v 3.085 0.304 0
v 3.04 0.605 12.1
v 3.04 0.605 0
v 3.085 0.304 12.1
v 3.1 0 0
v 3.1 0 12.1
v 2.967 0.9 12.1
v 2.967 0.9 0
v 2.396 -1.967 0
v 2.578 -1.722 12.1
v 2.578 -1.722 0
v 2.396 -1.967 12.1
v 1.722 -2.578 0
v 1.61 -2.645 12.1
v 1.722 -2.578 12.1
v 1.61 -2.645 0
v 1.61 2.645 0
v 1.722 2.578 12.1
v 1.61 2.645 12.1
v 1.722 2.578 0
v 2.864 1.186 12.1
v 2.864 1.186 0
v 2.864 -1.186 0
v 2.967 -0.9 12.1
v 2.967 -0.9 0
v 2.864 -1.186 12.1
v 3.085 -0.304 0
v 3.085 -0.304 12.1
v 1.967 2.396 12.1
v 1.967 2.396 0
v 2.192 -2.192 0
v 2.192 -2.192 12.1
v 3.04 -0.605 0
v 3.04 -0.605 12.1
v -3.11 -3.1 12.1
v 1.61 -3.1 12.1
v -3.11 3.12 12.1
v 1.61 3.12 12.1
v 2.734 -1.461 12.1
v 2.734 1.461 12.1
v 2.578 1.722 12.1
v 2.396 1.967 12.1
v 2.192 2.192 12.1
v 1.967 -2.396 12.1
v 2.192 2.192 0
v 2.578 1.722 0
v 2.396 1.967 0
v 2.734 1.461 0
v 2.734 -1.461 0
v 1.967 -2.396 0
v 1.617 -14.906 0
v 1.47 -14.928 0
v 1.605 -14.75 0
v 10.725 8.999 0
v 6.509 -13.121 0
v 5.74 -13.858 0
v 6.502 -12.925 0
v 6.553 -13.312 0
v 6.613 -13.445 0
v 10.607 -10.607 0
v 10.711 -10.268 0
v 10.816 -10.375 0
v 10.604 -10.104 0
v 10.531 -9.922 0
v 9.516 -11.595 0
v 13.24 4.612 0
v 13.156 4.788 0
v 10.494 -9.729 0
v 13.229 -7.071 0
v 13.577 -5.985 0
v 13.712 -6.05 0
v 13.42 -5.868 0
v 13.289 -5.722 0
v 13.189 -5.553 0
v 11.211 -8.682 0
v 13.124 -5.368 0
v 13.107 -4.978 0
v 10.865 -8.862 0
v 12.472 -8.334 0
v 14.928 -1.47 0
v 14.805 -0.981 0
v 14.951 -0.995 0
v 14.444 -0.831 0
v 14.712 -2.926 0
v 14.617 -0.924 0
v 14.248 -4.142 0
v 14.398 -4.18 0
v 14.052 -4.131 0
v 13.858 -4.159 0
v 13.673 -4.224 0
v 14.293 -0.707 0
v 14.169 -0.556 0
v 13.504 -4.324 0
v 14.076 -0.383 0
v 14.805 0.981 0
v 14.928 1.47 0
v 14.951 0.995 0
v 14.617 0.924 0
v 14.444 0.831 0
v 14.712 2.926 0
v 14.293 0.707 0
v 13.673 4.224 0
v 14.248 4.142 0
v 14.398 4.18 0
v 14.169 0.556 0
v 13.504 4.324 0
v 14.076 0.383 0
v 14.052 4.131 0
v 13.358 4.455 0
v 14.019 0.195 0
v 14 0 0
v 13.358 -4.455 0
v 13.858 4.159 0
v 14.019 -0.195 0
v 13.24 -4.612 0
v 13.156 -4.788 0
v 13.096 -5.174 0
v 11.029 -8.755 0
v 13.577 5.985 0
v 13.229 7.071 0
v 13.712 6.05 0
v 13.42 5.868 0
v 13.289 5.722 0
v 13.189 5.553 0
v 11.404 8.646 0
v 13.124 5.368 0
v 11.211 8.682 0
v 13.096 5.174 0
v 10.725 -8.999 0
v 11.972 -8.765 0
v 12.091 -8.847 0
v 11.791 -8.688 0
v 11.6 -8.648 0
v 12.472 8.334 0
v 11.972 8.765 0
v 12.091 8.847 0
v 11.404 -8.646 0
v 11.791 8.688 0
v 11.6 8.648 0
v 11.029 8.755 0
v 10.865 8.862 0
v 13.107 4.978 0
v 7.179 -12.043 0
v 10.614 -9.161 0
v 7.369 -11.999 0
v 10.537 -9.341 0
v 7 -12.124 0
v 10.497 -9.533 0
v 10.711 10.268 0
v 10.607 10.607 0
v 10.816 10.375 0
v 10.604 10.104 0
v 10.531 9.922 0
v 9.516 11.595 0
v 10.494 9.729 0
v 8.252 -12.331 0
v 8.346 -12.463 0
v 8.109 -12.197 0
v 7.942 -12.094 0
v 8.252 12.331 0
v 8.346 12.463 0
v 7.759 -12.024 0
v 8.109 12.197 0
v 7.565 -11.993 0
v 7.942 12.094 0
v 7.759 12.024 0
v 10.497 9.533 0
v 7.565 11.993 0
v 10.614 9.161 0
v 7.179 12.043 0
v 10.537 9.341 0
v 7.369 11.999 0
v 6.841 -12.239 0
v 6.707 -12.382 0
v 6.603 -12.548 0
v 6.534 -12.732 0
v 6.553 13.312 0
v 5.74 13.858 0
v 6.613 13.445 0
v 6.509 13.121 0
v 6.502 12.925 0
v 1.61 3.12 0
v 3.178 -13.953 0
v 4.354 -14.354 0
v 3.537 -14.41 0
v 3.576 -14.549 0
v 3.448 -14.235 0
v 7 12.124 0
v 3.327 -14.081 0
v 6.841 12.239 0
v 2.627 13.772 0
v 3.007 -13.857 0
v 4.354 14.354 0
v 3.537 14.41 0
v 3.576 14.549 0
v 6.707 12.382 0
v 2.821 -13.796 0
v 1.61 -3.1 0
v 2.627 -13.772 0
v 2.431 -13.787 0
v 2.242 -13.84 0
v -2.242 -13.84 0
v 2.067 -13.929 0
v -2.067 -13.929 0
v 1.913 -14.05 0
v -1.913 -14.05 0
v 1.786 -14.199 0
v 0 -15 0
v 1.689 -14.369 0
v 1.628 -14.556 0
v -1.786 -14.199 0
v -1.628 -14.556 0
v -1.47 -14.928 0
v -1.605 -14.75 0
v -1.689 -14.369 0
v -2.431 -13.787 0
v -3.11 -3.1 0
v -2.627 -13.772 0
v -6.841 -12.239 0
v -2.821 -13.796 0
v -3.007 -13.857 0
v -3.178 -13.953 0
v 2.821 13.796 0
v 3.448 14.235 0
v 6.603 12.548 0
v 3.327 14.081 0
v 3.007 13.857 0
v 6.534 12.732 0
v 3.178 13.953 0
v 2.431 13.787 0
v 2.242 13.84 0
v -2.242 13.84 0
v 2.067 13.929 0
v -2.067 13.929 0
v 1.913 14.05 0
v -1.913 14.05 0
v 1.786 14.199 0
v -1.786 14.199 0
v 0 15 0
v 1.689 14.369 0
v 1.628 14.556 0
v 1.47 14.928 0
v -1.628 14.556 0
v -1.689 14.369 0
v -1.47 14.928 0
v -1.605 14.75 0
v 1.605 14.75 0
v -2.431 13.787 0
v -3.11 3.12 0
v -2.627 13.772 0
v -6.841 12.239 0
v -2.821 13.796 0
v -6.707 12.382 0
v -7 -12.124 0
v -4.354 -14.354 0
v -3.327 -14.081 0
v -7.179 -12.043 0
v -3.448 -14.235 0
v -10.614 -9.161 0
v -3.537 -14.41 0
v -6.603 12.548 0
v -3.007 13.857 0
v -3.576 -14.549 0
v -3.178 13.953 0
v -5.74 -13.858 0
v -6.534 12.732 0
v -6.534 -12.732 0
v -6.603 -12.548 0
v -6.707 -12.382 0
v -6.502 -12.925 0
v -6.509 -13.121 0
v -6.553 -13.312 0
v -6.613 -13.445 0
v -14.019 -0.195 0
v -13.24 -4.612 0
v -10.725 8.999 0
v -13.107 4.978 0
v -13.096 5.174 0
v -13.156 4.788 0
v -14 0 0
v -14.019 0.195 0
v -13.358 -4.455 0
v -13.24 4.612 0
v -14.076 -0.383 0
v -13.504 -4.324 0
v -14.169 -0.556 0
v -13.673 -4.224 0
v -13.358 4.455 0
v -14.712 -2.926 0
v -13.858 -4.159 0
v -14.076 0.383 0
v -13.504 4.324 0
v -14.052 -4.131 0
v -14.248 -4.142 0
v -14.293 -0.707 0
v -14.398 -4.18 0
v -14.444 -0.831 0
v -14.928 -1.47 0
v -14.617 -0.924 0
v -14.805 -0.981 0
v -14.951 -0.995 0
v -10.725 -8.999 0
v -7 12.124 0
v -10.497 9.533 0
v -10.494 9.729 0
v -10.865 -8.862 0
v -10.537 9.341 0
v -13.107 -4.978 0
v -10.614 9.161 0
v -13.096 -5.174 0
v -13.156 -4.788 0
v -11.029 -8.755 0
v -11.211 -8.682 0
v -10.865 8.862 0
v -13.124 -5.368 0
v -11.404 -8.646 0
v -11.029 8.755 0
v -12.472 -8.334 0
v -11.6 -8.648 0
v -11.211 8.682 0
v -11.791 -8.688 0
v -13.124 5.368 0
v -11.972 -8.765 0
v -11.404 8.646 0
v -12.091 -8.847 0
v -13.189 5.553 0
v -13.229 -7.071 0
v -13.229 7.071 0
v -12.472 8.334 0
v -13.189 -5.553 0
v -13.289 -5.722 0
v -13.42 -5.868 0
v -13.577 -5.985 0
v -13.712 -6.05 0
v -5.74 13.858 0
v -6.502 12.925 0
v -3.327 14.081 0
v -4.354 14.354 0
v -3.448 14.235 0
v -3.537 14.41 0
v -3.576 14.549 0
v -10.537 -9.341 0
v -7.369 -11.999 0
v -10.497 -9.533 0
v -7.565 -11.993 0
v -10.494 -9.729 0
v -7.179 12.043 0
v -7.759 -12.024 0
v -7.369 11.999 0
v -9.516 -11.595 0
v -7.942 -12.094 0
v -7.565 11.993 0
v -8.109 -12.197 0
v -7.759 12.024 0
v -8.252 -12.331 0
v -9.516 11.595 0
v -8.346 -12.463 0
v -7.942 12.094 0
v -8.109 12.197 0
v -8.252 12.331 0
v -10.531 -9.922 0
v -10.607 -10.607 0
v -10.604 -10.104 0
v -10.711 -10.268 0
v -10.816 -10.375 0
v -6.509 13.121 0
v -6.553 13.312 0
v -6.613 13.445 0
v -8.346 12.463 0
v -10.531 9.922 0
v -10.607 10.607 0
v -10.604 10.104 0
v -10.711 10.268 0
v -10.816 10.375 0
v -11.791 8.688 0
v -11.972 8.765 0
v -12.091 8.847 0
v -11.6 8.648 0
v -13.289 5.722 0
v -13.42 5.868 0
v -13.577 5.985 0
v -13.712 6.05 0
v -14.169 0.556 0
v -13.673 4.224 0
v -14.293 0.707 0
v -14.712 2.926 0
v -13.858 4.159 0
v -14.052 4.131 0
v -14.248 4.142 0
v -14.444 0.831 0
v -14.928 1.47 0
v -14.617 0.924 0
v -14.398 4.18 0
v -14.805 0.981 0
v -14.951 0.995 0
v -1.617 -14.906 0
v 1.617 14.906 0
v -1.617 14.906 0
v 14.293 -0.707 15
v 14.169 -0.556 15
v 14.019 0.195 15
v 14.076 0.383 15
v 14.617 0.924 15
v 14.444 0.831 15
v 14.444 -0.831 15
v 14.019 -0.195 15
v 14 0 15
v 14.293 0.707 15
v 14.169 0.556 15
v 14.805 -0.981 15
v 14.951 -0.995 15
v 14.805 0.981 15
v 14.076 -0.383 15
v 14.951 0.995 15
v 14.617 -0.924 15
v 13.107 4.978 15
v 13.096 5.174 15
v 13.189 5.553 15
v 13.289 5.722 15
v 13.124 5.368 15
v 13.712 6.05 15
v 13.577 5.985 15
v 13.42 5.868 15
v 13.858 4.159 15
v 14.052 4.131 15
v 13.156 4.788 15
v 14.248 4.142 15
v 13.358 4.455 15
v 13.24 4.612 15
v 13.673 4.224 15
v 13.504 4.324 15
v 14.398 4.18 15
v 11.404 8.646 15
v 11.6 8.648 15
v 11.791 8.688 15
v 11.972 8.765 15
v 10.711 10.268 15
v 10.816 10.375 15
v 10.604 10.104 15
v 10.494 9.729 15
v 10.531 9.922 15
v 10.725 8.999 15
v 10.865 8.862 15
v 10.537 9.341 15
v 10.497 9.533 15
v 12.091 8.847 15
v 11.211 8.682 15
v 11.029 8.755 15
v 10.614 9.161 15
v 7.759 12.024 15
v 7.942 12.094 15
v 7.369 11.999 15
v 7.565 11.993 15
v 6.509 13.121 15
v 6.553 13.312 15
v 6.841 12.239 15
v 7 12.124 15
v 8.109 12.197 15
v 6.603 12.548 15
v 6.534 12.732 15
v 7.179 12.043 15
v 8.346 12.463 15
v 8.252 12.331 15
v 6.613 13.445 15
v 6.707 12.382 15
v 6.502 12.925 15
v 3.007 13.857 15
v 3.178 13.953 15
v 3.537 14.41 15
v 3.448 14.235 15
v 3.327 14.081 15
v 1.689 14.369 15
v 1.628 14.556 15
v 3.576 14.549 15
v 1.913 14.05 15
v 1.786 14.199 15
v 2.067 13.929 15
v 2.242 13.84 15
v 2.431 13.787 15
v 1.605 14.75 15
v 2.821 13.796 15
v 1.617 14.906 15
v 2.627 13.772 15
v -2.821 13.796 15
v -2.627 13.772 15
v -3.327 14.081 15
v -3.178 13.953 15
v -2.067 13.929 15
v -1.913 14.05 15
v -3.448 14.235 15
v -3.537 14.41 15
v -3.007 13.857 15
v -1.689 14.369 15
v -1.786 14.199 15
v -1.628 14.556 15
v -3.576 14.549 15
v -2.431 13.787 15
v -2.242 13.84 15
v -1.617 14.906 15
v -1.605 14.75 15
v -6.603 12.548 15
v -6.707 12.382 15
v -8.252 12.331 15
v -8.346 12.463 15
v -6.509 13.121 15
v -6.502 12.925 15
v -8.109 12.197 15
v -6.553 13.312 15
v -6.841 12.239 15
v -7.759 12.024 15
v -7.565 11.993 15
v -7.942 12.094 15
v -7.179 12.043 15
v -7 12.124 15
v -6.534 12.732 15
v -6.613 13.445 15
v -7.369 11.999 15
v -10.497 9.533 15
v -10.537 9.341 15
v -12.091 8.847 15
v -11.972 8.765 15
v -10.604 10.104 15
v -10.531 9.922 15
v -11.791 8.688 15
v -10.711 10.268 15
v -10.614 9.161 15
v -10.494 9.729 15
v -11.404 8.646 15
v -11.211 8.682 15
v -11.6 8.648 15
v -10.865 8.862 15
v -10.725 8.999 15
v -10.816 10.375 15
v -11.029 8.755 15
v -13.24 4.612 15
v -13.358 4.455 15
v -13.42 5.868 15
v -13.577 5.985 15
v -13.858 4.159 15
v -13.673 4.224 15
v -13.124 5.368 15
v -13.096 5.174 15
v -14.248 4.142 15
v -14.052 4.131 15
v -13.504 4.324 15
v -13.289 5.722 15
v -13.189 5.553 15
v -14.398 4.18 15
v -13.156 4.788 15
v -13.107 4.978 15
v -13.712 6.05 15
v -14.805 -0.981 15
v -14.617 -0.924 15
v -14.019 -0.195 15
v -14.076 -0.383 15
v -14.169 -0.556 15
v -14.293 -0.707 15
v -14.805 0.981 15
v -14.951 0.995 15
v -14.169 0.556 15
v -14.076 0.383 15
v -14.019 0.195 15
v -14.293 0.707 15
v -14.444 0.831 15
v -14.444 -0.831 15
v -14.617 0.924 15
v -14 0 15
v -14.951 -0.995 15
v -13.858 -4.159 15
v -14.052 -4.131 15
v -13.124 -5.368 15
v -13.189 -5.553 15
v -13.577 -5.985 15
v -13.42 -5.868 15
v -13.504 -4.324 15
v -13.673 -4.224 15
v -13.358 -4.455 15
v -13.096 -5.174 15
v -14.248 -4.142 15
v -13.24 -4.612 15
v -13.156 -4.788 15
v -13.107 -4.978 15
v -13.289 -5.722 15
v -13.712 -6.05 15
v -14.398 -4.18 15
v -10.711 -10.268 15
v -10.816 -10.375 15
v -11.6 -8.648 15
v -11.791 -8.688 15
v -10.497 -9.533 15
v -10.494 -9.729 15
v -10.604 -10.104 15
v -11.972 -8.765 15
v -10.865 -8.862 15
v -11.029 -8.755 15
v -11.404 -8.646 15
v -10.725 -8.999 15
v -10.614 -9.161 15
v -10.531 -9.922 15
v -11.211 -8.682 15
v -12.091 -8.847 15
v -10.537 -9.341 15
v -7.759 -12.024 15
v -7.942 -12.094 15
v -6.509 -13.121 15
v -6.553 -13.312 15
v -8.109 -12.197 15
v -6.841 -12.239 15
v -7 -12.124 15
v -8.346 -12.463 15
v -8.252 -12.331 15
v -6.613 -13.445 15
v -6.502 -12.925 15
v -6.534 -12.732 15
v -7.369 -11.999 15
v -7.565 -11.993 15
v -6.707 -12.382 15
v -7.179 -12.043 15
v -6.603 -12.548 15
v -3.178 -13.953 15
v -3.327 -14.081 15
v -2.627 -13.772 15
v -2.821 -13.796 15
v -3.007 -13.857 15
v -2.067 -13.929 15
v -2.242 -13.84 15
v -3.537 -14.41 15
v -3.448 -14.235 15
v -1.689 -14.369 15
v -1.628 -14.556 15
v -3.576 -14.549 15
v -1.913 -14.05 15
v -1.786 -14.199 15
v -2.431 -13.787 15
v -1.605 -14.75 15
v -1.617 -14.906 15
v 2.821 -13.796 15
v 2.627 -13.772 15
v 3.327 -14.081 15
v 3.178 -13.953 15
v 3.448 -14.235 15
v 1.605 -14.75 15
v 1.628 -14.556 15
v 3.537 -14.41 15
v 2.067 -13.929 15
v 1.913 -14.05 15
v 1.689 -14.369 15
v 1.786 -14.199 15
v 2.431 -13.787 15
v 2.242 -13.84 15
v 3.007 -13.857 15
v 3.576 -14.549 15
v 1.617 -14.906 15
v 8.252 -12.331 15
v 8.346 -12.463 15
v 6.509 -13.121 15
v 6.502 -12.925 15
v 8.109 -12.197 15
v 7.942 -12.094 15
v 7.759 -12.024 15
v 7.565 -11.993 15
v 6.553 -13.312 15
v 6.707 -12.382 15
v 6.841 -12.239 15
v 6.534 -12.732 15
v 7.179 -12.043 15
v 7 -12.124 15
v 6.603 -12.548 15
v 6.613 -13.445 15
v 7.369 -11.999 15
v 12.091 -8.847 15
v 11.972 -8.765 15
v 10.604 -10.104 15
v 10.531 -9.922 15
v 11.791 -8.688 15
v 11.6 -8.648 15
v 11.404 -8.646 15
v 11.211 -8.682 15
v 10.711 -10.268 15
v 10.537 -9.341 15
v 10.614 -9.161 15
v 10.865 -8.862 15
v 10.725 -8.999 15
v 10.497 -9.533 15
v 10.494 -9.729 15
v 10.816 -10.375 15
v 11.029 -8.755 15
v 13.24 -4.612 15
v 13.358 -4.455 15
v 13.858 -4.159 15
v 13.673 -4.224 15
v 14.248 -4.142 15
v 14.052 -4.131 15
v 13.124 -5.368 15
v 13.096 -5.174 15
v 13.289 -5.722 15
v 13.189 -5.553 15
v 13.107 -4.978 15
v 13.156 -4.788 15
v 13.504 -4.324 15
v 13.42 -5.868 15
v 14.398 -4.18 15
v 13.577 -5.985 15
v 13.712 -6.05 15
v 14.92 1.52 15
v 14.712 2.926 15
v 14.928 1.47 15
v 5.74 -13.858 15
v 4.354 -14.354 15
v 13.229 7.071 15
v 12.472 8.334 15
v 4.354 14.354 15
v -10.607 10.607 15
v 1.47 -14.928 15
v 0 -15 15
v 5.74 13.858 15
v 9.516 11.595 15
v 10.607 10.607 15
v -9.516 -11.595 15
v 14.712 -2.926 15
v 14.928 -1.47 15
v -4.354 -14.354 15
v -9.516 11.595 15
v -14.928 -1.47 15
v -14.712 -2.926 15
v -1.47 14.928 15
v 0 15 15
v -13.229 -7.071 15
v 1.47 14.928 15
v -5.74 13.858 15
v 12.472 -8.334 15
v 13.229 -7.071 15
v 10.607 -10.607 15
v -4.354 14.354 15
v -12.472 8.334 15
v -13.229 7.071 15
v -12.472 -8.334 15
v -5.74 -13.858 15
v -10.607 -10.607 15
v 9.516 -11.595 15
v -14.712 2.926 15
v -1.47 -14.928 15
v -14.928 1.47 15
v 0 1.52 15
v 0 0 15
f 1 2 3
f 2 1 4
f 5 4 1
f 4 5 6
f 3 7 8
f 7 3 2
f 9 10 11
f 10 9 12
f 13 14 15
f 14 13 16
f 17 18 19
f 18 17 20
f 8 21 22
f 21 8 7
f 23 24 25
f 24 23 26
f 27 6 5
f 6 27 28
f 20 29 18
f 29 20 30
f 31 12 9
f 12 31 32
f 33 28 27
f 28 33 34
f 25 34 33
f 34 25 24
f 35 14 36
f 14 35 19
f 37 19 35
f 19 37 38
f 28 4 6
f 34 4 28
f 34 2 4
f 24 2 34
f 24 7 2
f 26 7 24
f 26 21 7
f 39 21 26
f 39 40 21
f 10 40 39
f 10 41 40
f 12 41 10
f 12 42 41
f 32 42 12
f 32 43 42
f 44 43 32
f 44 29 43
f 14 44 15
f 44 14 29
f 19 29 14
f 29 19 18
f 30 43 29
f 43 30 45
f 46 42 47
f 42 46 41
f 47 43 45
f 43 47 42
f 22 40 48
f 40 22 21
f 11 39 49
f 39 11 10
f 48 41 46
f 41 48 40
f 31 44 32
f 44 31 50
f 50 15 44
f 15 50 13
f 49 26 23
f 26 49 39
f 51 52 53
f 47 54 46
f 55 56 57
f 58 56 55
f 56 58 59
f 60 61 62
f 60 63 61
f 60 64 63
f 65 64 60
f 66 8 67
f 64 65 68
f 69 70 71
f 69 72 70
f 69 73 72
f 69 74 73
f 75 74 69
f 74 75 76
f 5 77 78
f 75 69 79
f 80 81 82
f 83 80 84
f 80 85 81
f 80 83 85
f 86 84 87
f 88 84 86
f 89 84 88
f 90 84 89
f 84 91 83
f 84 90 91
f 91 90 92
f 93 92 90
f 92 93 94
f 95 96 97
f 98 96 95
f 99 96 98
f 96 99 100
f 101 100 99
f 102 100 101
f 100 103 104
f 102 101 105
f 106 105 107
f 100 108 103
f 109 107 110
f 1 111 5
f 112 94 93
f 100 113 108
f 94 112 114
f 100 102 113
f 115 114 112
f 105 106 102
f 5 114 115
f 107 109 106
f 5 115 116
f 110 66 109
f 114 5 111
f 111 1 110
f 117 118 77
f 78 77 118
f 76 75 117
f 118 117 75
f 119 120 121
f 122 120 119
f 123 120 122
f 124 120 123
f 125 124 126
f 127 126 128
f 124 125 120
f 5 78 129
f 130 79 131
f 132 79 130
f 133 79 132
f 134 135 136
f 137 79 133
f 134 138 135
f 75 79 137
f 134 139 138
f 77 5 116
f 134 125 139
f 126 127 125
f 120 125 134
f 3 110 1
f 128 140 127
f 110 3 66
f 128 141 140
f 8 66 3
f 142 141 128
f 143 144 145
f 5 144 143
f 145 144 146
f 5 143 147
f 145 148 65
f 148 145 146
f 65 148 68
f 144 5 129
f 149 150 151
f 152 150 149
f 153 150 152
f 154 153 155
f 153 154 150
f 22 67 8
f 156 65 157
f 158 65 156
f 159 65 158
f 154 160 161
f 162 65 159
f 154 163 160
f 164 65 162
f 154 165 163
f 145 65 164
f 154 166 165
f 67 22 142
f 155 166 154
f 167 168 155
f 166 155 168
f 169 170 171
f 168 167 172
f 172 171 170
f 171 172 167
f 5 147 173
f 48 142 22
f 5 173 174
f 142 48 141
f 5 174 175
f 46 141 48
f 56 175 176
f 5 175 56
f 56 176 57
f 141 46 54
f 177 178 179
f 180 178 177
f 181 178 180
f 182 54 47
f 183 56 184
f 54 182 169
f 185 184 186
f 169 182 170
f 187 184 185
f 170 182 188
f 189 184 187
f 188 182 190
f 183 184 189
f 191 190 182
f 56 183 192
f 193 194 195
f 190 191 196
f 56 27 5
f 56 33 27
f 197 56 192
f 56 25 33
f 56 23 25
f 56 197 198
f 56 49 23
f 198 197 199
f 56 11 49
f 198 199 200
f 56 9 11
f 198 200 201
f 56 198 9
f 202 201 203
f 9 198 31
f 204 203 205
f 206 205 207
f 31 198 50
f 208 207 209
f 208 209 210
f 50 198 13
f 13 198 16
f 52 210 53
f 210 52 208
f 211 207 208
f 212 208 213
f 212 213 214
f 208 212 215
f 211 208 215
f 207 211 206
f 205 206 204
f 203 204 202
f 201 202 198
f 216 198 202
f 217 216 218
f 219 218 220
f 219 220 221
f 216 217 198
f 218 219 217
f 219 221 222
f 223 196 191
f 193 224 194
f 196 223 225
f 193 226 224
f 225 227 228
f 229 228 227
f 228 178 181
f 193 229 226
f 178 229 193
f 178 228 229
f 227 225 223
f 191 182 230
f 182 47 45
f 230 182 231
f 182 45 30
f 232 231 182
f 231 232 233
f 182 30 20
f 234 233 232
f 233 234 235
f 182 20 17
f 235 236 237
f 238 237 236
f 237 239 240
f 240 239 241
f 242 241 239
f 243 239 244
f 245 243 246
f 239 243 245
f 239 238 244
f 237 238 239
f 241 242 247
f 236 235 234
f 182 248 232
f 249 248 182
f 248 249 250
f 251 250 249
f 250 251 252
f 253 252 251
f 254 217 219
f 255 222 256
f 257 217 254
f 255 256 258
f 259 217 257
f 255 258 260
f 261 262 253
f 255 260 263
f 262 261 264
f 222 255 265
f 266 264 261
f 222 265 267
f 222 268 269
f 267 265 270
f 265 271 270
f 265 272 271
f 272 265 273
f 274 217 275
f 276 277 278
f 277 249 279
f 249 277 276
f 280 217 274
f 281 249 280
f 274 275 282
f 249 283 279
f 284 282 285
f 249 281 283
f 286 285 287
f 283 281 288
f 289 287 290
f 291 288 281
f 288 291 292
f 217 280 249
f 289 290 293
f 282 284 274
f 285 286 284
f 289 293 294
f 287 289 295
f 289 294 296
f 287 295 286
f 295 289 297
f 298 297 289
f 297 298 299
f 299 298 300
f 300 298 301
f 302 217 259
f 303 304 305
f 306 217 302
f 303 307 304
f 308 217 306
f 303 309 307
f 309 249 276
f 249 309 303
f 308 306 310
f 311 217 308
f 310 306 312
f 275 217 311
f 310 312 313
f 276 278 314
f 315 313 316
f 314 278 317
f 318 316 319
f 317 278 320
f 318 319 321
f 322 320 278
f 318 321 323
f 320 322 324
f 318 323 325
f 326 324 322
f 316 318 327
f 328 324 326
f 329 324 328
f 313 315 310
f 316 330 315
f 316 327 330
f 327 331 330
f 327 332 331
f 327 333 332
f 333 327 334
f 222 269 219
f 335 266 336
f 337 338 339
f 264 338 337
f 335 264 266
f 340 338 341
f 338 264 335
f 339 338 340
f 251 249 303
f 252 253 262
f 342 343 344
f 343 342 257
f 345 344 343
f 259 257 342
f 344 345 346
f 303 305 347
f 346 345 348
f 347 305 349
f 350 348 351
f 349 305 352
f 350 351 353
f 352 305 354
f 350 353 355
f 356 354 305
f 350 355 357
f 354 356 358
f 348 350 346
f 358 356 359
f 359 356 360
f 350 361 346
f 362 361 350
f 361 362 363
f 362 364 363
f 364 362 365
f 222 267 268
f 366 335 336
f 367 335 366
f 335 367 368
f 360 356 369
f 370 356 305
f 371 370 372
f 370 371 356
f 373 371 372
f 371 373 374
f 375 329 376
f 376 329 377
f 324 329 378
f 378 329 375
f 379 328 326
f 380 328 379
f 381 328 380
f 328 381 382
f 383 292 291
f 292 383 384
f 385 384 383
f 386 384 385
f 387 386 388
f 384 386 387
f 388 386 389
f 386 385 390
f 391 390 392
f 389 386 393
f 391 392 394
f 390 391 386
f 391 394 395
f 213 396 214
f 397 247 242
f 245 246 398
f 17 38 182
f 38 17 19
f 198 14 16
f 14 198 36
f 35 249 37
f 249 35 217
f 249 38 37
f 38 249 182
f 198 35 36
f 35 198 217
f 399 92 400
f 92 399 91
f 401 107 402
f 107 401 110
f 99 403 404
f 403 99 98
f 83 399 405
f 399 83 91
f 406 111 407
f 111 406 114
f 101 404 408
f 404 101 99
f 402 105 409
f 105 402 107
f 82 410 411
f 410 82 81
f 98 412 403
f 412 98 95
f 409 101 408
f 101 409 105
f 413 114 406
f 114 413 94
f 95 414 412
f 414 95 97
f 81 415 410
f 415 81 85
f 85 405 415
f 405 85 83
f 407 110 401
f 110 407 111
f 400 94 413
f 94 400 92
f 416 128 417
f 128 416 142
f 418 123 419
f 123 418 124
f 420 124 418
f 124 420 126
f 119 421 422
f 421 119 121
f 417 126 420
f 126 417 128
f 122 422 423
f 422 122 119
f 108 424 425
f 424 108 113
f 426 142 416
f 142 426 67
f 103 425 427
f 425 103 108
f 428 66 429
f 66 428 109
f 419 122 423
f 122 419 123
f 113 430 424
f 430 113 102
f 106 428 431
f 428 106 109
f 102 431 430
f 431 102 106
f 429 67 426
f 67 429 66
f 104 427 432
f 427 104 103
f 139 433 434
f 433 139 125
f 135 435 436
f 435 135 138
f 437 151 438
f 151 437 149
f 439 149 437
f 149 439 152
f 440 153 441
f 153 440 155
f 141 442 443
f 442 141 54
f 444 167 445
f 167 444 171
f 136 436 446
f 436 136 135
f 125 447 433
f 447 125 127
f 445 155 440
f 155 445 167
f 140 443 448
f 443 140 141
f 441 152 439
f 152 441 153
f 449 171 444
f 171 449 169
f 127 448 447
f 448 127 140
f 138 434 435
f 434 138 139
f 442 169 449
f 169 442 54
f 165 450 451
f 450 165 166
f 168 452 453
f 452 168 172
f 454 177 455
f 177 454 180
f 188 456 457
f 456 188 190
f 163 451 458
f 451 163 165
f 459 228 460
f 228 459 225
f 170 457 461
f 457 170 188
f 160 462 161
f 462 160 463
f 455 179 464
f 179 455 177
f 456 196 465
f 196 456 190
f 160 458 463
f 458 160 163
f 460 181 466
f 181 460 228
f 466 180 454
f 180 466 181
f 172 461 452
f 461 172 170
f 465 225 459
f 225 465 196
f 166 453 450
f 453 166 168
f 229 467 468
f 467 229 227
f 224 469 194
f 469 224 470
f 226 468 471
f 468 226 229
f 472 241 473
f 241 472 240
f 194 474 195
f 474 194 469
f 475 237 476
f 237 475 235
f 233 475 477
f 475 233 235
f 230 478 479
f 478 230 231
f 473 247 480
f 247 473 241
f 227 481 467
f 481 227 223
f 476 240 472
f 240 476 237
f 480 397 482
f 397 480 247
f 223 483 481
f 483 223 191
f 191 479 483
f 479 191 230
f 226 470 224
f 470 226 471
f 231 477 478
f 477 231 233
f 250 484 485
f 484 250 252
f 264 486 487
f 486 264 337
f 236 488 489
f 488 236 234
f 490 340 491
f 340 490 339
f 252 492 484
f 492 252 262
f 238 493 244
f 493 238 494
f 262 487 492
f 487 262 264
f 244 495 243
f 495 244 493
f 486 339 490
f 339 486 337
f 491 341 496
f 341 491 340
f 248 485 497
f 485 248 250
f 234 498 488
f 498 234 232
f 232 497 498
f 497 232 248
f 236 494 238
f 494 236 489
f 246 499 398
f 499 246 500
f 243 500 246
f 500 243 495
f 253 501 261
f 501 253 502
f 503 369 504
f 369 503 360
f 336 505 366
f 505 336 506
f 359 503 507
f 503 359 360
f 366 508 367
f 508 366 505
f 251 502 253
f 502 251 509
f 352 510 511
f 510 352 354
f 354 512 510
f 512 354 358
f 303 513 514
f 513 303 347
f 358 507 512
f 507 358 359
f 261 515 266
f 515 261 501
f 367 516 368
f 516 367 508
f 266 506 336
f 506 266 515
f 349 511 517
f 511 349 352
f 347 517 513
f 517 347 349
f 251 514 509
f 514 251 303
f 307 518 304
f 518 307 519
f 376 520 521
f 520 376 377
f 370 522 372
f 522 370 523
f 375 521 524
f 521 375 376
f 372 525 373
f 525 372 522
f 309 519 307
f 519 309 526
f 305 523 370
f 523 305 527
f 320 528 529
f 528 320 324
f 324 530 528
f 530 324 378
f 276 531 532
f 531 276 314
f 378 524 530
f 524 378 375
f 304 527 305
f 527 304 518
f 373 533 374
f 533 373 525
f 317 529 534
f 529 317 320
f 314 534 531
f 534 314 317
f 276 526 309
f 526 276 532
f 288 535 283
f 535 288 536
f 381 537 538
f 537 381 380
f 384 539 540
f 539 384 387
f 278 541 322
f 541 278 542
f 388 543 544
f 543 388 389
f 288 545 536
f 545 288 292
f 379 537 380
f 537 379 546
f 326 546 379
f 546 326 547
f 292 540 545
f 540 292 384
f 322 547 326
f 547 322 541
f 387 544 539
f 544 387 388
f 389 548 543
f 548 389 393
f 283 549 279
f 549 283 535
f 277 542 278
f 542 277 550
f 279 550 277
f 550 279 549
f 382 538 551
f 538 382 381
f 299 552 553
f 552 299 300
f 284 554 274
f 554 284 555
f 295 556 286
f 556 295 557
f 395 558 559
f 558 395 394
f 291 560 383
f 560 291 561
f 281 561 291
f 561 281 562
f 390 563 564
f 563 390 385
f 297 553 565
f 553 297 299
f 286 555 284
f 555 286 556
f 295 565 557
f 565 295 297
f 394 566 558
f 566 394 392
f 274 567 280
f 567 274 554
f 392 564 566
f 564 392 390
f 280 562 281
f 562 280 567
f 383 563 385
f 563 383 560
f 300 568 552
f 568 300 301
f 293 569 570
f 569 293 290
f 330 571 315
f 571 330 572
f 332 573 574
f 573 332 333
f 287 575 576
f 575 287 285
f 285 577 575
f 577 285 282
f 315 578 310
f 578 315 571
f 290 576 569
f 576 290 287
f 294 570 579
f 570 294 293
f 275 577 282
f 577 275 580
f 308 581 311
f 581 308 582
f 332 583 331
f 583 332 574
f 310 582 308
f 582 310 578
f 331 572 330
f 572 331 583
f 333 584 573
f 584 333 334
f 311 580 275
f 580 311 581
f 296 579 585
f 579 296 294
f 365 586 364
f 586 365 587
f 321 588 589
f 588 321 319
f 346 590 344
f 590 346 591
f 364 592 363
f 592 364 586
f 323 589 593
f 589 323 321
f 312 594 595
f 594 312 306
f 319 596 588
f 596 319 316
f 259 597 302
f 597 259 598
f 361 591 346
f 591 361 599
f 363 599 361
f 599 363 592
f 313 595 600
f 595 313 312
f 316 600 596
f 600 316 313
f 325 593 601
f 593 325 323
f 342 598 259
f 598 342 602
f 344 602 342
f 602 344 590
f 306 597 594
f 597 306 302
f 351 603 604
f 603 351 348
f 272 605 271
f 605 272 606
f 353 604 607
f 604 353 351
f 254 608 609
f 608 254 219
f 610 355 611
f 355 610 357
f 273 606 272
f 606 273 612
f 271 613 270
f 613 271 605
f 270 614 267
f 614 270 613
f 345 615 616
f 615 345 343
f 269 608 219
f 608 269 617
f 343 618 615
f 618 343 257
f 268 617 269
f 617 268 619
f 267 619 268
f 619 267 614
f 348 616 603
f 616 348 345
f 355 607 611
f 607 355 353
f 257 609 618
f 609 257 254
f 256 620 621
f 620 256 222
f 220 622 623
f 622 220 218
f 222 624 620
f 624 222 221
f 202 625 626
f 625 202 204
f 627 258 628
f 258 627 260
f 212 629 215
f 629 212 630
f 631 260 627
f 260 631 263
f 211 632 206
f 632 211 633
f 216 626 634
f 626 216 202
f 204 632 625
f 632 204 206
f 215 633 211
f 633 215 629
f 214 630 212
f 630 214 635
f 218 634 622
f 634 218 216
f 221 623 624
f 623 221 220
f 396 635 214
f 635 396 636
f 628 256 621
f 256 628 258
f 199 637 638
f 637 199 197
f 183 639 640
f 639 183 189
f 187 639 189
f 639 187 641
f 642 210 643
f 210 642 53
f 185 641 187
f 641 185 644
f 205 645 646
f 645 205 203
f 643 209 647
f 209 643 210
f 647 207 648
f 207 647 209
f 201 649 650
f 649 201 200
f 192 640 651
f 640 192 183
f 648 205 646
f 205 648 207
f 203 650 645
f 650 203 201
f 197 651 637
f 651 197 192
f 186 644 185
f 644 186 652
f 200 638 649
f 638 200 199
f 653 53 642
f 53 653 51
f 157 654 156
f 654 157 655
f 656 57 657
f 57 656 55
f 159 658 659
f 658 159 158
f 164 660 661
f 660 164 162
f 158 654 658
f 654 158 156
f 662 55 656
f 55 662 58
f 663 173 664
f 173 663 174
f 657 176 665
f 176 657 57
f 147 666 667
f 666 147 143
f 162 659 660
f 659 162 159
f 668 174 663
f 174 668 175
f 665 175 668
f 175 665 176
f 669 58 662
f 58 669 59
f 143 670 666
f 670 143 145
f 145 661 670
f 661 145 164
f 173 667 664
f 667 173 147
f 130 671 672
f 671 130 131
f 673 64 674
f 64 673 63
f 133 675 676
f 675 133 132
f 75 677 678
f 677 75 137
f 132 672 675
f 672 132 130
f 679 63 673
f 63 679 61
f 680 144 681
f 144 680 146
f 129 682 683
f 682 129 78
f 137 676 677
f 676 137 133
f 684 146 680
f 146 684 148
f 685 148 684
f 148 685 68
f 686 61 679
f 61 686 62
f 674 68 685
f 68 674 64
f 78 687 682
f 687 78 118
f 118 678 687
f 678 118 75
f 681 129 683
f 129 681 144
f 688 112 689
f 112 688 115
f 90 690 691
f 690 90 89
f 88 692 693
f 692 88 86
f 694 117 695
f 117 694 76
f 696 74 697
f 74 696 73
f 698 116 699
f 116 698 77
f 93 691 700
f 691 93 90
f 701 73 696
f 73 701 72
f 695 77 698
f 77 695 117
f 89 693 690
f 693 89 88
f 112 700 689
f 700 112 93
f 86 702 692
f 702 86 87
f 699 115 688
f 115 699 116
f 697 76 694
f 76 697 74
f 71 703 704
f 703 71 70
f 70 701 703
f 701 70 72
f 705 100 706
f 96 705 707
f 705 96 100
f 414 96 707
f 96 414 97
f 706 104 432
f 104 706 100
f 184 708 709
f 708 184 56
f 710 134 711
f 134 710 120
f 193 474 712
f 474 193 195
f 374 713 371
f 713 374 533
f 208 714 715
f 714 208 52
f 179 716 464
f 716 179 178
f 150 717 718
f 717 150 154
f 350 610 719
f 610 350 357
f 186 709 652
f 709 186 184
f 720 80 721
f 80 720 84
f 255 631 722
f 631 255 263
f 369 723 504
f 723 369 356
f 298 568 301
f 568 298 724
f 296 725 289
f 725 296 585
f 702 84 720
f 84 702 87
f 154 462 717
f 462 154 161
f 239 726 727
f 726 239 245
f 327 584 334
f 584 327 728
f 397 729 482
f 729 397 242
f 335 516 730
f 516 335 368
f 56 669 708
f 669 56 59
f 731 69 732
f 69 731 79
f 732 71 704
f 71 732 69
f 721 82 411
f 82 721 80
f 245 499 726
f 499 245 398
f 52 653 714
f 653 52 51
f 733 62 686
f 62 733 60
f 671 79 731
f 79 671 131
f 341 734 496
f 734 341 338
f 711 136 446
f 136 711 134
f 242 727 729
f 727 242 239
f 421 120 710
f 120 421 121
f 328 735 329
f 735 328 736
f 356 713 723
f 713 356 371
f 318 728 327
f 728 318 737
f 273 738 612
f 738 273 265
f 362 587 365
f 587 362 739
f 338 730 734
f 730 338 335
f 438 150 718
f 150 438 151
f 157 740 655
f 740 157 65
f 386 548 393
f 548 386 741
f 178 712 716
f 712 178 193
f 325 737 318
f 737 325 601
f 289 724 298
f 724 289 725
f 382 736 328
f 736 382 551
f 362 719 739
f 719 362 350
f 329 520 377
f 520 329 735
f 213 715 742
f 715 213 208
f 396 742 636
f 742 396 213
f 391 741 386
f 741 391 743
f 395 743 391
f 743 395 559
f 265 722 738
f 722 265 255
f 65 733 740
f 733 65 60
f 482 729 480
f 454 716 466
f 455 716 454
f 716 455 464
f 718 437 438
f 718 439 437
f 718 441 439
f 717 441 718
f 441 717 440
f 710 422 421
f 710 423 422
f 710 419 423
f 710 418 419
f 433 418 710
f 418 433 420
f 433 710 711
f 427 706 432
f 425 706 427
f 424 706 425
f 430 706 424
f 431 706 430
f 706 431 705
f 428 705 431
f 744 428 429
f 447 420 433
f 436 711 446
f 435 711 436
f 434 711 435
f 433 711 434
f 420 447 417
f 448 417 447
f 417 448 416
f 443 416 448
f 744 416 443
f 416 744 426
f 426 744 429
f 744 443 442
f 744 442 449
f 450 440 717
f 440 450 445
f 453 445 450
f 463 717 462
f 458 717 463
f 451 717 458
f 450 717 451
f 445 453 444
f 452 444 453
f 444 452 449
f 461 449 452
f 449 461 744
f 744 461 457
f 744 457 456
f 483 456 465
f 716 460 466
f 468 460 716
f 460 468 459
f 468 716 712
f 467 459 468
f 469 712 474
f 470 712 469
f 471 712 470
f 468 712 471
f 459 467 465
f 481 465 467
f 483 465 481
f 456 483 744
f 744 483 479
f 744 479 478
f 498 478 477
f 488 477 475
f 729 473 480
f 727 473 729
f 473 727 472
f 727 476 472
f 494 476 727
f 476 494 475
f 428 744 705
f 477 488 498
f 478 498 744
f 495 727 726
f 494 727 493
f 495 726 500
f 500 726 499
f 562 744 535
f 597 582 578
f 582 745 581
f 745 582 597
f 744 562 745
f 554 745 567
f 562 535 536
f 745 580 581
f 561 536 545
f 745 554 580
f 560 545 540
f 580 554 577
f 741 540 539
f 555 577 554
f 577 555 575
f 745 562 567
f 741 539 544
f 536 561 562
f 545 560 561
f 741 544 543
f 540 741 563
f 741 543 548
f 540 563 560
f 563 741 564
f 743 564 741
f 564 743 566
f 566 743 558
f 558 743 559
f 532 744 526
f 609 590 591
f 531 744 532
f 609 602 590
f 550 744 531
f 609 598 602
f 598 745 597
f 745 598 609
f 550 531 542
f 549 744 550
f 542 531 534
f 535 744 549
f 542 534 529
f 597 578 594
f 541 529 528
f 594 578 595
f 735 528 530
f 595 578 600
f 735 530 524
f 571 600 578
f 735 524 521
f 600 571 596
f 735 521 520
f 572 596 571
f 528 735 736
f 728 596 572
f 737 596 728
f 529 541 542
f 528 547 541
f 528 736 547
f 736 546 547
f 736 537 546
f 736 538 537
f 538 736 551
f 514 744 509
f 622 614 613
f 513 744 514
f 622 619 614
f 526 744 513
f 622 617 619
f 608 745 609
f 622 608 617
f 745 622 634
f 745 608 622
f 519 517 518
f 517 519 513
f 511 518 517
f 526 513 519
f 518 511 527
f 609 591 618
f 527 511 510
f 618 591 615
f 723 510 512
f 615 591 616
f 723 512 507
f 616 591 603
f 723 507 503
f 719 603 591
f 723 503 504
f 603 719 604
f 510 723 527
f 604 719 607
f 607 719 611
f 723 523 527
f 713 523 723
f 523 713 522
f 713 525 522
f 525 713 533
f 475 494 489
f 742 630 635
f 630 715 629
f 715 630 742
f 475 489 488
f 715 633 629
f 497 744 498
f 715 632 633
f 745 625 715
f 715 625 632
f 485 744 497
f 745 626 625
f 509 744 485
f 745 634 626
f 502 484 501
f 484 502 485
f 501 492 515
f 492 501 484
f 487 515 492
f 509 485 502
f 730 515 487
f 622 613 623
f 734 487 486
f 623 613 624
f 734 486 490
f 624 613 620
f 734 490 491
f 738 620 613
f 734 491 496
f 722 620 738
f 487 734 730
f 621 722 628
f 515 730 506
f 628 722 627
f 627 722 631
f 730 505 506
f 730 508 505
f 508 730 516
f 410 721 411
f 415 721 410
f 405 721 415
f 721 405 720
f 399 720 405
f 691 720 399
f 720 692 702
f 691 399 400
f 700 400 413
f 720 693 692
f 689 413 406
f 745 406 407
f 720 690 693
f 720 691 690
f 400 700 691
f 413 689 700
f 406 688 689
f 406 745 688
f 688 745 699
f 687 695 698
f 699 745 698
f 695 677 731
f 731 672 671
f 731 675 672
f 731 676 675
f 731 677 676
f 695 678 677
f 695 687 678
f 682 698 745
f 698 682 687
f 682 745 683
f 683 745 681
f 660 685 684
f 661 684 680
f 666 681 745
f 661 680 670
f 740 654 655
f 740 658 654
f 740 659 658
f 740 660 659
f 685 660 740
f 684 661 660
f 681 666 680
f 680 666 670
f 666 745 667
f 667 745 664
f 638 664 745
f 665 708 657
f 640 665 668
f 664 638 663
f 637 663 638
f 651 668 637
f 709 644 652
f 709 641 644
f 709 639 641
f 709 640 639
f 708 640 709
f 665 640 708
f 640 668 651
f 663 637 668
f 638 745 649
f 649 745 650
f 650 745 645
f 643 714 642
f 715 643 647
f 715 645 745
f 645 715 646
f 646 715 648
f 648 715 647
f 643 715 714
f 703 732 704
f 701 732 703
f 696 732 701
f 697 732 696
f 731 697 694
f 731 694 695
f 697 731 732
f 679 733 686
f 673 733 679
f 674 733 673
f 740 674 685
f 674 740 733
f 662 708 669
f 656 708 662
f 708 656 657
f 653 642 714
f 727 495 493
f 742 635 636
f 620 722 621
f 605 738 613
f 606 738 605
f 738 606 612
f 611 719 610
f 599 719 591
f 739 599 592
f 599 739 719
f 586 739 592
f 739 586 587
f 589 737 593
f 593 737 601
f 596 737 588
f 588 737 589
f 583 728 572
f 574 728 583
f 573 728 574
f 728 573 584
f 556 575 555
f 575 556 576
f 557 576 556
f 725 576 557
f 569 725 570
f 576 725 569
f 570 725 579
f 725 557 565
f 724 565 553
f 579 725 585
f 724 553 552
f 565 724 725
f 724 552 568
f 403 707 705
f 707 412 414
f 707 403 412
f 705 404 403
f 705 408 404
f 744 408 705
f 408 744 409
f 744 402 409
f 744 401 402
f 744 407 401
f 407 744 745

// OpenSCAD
// Replacement knob for hotplate stirrer
// D-shaft: 6mm nominal, 6.2mm bore diameter, 4.7mm width (flat-to-arc)
// Knob: 30mm diameter, 15mm tall
// Print orientation: Bottom face (z=0) rests on bed.

// --- Dimensions ---
knob_diameter = 30;
knob_height = 15;
bore_diameter = 6.2;
bore_width = 4.7; // Distance from flat to opposite arc
bore_depth = 12;
grip_groove_diameter = 2;
num_grip_grooves = 18;
pointer_groove_width = 1.5;
pointer_groove_depth = 1;

// --- Calculated Values ---
knob_radius = knob_diameter / 2;
bore_radius = bore_diameter / 2;

// Calculate position of the flat face of the D-bore.
// The distance from the flat to the far side of the circle is 4.7mm.
// The total diameter is 6.2mm.
// Distance from center to flat = (Diameter - Width) / 2 ? No.
// Width = Distance from flat to far arc.
// Let x be distance from center to flat.
// Width = x + radius.
// x = Width - radius = 4.7 - 3.1 = 1.6mm.
// So the flat is at x = -1.6 (if flat is on the left/negative side).
flat_offset = bore_width - bore_radius; // 1.6

// --- Main Model ---
difference() {
    // 1. Outer Cylinder
    cylinder(r = knob_radius, h = knob_height, center = false, $fn = 64);

    // 2. D-Shaped Blind Bore
    // The bore is 12mm deep, starting from z=0.
    // It consists of a circular hole with one side flattened.
    // We cut a cylinder, then cut a box to create the flat.
    
    // Cut the circular part of the bore
    // Extend slightly past z=12 to ensure clean cut
    translate([0, 0, 0]) {
        cylinder(r = bore_radius, h = bore_depth + 0.1, center = false, $fn = 64);
        
        // Cut the flat side
        // The flat is on the negative X side.
        // The flat face is at x = -flat_offset = -1.6.
        // We cut a box that covers the left part of the bore.
        // Box X range: from -bore_radius to -flat_offset (plus margin)
        // Box Y range: -bore_radius to bore_radius
        // Box Z range: 0 to bore_depth
        translate([-bore_radius - 0.01, -bore_radius, 0]) {
            cube([
                (bore_radius + flat_offset) + 0.02, // Width: from far left to flat, plus margin
                2 * bore_radius + 0.02,             // Height in Y
                bore_depth + 0.1                      // Height in Z
            ], center = false);
        }
    }

    // 3. Grip Grooves
    // 18 evenly spaced vertical grooves on the outer surface.
    // Each is a 2mm diameter half-cylinder.
    // "Half-cylinder centred on the outer surface" implies the groove profile is a semi-circle.
    // We cut a cylinder of radius 1mm (diameter 2mm) from the surface.
    // To make it a "half-cylinder" groove, we subtract a cylinder of radius 1mm.
    // Since the center is on the surface, half the cylinder is inside the part (the groove)
    // and half is outside (which is removed by the difference anyway).
    // So we just subtract a cylinder of r=1, h=knob_height, centered at the surface.
    
    for (i = [0 : num_grip_grooves - 1]) {
        angle = i * 360 / num_grip_grooves;
        
        // Position on the surface
        px = knob_radius * cos(angle);
        py = knob_radius * sin(angle);
        
        translate([px, py, 0]) {
            // Rotate to align the cylinder axis radially
            rotate([0, 0, angle]) {
                // Cut the groove
                // The cylinder axis is now along the X-axis (radial direction)
                // We cut a cylinder of radius 1mm.
                // To ensure it cuts cleanly, we make it slightly longer than the knob height.
                cylinder(r = grip_groove_diameter / 2, h = knob_height + 0.1, center = false, $fn = 32);
            }
        }
    }

    // 4. Pointer Groove
    // 1.5mm wide, 1mm deep, on the top face.
    // Runs from the center to the outer edge.
    // On the same side as the flat of the D (negative X side).
    // We cut a rectangular slot from z=15 down to z=14.
    // It runs from x=0 to x=knob_radius.
    // Width is 1.5mm, so it spans y from -0.75 to 0.75.
    
    translate([0, 0, knob_height]) {
        // Cut the slot
        // X: from 0 to knob_radius (plus margin to ensure it reaches the edge)
        // Y: -0.75 to 0.75 (plus margin)
        // Z: 0 to 1mm deep (plus margin)
        translate([0, 0, 0]) {
            cube([
                knob_radius + 0.01, // Length: center to edge
                pointer_groove_width + 0.02, // Width
                pointer_groove_depth + 0.01  // Depth
            ], center = false);
        }
    }
}
